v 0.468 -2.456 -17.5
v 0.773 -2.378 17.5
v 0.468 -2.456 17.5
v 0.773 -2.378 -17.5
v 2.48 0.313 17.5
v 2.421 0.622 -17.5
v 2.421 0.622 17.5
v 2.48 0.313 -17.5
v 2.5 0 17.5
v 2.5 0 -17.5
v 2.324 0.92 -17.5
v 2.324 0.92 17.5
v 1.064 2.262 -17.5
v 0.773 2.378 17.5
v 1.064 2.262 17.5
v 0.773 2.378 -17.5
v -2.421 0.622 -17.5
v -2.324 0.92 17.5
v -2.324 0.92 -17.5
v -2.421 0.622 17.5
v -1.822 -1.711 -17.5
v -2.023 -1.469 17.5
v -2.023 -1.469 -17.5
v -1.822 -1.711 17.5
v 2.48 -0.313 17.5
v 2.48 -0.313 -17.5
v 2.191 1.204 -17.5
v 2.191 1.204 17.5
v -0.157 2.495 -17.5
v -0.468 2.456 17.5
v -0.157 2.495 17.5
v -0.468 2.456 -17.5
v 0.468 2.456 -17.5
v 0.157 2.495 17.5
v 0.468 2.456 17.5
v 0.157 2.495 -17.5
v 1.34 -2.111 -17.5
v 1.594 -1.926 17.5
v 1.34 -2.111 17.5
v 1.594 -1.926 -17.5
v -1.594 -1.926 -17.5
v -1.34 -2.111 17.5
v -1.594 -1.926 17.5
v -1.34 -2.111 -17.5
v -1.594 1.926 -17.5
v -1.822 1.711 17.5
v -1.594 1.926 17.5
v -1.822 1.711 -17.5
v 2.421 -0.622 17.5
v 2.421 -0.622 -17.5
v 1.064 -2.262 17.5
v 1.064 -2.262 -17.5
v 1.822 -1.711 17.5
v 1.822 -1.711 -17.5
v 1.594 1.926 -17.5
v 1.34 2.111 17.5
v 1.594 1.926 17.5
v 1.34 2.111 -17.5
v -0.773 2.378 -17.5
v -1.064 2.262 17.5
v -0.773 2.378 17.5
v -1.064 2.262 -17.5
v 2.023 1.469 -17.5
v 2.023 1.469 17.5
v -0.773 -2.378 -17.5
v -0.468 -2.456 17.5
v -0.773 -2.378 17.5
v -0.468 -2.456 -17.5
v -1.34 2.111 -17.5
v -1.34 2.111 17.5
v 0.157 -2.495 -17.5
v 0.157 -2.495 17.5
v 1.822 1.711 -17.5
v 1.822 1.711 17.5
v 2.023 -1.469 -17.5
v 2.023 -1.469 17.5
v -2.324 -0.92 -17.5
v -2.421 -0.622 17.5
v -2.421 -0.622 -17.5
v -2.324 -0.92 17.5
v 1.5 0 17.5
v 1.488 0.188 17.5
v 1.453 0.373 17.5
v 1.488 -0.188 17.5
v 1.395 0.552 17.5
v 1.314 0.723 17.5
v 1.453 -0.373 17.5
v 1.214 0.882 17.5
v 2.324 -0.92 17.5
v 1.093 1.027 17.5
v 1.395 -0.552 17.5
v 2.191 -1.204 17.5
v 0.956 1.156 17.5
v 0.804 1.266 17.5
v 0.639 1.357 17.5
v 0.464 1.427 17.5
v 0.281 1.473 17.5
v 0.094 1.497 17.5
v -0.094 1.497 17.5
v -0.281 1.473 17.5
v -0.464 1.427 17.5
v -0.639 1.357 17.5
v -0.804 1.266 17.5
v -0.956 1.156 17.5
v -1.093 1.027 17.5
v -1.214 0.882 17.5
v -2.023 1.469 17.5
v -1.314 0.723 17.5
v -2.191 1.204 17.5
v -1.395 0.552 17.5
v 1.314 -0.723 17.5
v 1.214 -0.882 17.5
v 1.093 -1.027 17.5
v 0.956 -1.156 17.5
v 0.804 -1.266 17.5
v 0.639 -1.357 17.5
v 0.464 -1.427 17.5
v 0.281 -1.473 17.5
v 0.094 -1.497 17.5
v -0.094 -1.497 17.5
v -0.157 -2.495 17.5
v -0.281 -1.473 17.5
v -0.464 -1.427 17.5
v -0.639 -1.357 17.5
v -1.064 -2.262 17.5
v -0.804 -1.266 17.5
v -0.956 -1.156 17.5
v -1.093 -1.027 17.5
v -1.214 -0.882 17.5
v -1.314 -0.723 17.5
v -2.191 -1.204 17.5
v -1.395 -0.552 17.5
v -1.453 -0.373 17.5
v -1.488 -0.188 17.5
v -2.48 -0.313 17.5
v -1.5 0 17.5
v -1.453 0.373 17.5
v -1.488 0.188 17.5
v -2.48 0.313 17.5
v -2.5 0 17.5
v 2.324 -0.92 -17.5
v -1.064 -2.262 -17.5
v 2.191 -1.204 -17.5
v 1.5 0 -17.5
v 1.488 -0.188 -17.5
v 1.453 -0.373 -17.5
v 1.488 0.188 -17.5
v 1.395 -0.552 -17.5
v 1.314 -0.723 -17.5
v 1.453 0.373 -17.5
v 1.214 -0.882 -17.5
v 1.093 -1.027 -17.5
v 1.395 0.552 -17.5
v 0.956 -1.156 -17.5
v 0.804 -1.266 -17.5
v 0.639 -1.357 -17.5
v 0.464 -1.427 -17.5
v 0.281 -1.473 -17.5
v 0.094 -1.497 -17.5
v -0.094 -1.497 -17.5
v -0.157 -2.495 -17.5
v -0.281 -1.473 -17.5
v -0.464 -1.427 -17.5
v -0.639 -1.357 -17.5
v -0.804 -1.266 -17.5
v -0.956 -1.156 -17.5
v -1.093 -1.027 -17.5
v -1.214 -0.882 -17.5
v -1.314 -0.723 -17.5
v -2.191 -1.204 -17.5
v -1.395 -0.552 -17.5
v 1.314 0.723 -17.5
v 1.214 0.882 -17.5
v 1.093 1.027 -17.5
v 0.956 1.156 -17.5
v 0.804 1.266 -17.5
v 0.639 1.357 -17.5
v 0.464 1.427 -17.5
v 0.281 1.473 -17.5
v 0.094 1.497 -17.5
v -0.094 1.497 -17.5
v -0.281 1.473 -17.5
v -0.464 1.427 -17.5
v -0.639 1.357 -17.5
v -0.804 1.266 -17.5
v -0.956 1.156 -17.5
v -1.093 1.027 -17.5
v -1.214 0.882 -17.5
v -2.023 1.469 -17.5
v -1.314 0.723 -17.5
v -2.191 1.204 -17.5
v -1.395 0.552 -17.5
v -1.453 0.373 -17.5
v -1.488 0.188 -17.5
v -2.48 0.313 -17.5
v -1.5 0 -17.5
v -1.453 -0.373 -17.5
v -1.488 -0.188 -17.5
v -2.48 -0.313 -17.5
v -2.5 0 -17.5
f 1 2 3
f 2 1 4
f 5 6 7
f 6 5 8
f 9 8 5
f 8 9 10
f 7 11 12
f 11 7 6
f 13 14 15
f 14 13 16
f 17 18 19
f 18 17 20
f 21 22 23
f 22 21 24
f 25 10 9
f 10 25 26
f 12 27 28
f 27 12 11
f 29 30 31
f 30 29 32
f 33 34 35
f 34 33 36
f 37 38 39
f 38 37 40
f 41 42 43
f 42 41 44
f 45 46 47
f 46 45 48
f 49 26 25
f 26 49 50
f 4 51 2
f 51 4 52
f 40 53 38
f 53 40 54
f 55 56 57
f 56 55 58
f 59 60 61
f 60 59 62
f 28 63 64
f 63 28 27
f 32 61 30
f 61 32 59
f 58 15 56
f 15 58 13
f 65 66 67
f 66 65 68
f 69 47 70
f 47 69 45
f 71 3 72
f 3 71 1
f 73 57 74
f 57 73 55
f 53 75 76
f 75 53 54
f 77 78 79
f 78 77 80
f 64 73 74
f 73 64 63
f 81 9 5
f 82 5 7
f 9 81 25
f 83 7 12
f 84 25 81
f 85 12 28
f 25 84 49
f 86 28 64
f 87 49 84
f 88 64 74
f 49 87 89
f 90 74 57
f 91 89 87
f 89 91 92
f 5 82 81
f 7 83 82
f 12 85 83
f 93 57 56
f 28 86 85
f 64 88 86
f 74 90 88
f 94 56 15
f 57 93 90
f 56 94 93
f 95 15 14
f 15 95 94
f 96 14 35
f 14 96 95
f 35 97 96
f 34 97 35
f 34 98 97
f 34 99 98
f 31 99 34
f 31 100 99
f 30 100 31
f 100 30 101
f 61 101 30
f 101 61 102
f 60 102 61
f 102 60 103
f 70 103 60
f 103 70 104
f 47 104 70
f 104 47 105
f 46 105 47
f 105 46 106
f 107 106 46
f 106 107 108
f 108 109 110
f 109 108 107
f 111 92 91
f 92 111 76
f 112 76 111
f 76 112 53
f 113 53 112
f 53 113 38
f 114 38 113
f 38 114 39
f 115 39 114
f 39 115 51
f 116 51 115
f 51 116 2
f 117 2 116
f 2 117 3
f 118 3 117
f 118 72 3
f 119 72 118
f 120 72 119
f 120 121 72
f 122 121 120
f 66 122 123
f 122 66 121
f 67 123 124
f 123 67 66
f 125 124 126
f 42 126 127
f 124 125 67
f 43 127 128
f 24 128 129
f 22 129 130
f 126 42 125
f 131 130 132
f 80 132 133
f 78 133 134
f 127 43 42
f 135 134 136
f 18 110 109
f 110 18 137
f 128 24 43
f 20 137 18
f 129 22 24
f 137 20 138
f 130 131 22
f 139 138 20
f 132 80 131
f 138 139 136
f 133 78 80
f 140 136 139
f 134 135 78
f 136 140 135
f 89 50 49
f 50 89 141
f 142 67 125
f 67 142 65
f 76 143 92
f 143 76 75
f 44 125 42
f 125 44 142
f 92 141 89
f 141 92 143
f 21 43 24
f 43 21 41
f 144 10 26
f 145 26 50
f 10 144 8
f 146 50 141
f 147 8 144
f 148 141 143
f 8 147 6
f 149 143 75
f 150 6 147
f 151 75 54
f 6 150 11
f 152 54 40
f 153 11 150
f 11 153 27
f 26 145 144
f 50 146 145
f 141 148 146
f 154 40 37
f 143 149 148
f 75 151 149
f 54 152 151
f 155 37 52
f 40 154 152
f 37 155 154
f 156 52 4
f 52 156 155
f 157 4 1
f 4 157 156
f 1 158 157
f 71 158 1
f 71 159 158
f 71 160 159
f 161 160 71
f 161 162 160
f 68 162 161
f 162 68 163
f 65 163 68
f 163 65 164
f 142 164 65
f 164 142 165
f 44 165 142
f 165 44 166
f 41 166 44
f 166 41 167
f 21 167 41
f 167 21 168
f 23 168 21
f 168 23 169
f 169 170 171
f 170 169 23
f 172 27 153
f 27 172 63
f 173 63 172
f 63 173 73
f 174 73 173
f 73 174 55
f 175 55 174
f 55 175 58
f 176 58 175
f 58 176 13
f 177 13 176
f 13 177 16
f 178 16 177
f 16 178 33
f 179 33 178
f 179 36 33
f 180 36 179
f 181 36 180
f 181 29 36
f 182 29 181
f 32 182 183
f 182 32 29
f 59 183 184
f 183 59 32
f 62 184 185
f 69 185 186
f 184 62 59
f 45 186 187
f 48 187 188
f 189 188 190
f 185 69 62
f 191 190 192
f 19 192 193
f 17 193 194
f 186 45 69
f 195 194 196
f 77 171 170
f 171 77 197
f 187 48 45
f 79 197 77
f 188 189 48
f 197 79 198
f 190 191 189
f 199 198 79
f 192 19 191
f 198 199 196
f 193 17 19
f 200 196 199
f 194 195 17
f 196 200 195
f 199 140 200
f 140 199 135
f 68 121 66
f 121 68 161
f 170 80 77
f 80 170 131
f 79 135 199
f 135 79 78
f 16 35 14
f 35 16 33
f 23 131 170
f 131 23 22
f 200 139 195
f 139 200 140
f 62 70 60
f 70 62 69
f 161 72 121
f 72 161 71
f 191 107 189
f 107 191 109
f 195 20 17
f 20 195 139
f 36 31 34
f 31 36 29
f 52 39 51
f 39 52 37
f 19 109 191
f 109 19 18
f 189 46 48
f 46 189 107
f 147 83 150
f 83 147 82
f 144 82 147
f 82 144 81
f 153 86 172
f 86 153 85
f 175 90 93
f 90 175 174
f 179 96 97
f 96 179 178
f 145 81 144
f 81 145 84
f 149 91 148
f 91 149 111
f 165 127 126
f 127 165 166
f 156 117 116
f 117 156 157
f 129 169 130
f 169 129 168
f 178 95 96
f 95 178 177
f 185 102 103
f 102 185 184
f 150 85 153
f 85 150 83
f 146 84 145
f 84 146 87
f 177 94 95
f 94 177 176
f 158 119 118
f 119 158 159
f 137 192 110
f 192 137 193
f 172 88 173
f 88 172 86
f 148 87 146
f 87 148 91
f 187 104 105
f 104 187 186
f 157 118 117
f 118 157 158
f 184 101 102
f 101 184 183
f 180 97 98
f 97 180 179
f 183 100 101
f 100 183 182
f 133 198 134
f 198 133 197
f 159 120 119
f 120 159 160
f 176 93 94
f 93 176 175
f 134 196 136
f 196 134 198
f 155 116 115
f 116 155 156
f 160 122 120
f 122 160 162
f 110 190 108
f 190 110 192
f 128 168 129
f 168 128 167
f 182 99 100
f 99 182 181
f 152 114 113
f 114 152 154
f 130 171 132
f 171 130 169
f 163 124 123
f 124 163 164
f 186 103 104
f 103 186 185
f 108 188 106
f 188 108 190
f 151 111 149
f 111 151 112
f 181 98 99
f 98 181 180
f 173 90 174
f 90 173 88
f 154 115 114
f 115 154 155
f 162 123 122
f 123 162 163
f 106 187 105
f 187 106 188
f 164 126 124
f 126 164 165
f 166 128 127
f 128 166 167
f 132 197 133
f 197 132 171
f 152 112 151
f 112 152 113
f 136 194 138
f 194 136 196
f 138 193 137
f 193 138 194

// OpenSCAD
$fn = 50;


difference() {
	union() {
		translate(v = [0, 0, -17.5000000000]) {
			cylinder(h = 35, r = 2.5000000000);
		}
	}
	union() {
		translate(v = [0, 0, -100.0000000000]) {
			cylinder(h = 200, r = 1.5000000000);
		}
	}
}
